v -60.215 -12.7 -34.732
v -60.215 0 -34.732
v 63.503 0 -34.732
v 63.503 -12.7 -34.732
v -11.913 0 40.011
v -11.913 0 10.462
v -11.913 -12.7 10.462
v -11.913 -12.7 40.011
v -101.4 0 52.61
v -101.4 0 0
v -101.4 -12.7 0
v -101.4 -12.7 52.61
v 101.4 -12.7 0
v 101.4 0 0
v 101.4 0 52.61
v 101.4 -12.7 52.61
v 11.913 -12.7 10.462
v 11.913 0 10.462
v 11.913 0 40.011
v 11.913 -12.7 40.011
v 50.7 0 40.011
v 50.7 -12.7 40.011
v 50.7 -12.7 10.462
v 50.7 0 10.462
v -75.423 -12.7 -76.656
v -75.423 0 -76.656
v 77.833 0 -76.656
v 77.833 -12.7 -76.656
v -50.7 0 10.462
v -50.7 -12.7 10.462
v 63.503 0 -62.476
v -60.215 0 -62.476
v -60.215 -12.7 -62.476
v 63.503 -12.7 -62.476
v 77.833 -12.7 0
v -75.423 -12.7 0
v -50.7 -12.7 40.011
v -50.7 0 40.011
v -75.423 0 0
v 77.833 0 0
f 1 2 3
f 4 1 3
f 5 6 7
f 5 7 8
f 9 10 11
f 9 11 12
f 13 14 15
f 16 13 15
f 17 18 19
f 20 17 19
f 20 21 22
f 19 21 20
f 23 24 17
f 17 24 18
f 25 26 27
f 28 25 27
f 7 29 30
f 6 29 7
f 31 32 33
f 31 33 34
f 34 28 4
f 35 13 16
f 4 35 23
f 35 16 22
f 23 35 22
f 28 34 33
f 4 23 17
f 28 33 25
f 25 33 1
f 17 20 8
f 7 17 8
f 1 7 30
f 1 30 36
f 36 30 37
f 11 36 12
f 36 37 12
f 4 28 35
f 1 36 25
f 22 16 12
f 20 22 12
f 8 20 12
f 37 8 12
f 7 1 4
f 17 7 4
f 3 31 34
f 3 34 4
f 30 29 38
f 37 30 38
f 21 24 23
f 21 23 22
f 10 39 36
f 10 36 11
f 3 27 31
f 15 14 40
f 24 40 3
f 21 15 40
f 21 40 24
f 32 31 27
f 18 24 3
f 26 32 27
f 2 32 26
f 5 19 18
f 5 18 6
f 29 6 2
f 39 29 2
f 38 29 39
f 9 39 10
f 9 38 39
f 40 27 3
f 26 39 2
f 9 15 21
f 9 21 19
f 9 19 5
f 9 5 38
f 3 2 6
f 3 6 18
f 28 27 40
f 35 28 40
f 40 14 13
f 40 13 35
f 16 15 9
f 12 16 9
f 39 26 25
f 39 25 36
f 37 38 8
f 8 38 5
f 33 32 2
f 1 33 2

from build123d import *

# Parameters (mm, degrees)
F0_W     = 101.399846375
F0_H     = 52.6096001267
F0_W_2   = 38.787077181
F0_H_2   = 29.5493621379
F1_DEPTH = 12.7
F3_W     = 153.2556563616
F3_H     = 76.6561478376
F3_W_2   = 123.7184926867
F3_H_2   = 27.7441889048
F4_DEPTH = 12.7


# Not quite as in the source:
# - the program builds the solid bodies; features that only make, move or delete a surface that nothing else refers to are left out


with BuildPart() as f1:
    # F0 (on Front) → F1 (new body)
    with BuildSketch(Plane.XZ):
        with Locations((-50.6999231875, 26.3048000634)):
            Rectangle(F0_W, F0_H)
        with Locations((-31.306384597, 25.2366727218)):
            Rectangle(F0_W_2, F0_H_2, mode=Mode.SUBTRACT)
    extrude(amount=F1_DEPTH)

    # F2: F1 across plane


with BuildPart() as f1_1:
    add(f1.part)
    add(f1.part.mirror(Plane.YZ))

    # F3 (on Front) → F4 (join)
    with BuildSketch(Plane.XZ):
        with Locations((1.2047663331, -38.3280739188)):
            Rectangle(F3_W, F3_H)
        with Locations((1.6441084445, -48.6036911607)):
            Rectangle(F3_W_2, F3_H_2, mode=Mode.SUBTRACT)
    extrude(amount=F4_DEPTH)


solid = f1_1.part
